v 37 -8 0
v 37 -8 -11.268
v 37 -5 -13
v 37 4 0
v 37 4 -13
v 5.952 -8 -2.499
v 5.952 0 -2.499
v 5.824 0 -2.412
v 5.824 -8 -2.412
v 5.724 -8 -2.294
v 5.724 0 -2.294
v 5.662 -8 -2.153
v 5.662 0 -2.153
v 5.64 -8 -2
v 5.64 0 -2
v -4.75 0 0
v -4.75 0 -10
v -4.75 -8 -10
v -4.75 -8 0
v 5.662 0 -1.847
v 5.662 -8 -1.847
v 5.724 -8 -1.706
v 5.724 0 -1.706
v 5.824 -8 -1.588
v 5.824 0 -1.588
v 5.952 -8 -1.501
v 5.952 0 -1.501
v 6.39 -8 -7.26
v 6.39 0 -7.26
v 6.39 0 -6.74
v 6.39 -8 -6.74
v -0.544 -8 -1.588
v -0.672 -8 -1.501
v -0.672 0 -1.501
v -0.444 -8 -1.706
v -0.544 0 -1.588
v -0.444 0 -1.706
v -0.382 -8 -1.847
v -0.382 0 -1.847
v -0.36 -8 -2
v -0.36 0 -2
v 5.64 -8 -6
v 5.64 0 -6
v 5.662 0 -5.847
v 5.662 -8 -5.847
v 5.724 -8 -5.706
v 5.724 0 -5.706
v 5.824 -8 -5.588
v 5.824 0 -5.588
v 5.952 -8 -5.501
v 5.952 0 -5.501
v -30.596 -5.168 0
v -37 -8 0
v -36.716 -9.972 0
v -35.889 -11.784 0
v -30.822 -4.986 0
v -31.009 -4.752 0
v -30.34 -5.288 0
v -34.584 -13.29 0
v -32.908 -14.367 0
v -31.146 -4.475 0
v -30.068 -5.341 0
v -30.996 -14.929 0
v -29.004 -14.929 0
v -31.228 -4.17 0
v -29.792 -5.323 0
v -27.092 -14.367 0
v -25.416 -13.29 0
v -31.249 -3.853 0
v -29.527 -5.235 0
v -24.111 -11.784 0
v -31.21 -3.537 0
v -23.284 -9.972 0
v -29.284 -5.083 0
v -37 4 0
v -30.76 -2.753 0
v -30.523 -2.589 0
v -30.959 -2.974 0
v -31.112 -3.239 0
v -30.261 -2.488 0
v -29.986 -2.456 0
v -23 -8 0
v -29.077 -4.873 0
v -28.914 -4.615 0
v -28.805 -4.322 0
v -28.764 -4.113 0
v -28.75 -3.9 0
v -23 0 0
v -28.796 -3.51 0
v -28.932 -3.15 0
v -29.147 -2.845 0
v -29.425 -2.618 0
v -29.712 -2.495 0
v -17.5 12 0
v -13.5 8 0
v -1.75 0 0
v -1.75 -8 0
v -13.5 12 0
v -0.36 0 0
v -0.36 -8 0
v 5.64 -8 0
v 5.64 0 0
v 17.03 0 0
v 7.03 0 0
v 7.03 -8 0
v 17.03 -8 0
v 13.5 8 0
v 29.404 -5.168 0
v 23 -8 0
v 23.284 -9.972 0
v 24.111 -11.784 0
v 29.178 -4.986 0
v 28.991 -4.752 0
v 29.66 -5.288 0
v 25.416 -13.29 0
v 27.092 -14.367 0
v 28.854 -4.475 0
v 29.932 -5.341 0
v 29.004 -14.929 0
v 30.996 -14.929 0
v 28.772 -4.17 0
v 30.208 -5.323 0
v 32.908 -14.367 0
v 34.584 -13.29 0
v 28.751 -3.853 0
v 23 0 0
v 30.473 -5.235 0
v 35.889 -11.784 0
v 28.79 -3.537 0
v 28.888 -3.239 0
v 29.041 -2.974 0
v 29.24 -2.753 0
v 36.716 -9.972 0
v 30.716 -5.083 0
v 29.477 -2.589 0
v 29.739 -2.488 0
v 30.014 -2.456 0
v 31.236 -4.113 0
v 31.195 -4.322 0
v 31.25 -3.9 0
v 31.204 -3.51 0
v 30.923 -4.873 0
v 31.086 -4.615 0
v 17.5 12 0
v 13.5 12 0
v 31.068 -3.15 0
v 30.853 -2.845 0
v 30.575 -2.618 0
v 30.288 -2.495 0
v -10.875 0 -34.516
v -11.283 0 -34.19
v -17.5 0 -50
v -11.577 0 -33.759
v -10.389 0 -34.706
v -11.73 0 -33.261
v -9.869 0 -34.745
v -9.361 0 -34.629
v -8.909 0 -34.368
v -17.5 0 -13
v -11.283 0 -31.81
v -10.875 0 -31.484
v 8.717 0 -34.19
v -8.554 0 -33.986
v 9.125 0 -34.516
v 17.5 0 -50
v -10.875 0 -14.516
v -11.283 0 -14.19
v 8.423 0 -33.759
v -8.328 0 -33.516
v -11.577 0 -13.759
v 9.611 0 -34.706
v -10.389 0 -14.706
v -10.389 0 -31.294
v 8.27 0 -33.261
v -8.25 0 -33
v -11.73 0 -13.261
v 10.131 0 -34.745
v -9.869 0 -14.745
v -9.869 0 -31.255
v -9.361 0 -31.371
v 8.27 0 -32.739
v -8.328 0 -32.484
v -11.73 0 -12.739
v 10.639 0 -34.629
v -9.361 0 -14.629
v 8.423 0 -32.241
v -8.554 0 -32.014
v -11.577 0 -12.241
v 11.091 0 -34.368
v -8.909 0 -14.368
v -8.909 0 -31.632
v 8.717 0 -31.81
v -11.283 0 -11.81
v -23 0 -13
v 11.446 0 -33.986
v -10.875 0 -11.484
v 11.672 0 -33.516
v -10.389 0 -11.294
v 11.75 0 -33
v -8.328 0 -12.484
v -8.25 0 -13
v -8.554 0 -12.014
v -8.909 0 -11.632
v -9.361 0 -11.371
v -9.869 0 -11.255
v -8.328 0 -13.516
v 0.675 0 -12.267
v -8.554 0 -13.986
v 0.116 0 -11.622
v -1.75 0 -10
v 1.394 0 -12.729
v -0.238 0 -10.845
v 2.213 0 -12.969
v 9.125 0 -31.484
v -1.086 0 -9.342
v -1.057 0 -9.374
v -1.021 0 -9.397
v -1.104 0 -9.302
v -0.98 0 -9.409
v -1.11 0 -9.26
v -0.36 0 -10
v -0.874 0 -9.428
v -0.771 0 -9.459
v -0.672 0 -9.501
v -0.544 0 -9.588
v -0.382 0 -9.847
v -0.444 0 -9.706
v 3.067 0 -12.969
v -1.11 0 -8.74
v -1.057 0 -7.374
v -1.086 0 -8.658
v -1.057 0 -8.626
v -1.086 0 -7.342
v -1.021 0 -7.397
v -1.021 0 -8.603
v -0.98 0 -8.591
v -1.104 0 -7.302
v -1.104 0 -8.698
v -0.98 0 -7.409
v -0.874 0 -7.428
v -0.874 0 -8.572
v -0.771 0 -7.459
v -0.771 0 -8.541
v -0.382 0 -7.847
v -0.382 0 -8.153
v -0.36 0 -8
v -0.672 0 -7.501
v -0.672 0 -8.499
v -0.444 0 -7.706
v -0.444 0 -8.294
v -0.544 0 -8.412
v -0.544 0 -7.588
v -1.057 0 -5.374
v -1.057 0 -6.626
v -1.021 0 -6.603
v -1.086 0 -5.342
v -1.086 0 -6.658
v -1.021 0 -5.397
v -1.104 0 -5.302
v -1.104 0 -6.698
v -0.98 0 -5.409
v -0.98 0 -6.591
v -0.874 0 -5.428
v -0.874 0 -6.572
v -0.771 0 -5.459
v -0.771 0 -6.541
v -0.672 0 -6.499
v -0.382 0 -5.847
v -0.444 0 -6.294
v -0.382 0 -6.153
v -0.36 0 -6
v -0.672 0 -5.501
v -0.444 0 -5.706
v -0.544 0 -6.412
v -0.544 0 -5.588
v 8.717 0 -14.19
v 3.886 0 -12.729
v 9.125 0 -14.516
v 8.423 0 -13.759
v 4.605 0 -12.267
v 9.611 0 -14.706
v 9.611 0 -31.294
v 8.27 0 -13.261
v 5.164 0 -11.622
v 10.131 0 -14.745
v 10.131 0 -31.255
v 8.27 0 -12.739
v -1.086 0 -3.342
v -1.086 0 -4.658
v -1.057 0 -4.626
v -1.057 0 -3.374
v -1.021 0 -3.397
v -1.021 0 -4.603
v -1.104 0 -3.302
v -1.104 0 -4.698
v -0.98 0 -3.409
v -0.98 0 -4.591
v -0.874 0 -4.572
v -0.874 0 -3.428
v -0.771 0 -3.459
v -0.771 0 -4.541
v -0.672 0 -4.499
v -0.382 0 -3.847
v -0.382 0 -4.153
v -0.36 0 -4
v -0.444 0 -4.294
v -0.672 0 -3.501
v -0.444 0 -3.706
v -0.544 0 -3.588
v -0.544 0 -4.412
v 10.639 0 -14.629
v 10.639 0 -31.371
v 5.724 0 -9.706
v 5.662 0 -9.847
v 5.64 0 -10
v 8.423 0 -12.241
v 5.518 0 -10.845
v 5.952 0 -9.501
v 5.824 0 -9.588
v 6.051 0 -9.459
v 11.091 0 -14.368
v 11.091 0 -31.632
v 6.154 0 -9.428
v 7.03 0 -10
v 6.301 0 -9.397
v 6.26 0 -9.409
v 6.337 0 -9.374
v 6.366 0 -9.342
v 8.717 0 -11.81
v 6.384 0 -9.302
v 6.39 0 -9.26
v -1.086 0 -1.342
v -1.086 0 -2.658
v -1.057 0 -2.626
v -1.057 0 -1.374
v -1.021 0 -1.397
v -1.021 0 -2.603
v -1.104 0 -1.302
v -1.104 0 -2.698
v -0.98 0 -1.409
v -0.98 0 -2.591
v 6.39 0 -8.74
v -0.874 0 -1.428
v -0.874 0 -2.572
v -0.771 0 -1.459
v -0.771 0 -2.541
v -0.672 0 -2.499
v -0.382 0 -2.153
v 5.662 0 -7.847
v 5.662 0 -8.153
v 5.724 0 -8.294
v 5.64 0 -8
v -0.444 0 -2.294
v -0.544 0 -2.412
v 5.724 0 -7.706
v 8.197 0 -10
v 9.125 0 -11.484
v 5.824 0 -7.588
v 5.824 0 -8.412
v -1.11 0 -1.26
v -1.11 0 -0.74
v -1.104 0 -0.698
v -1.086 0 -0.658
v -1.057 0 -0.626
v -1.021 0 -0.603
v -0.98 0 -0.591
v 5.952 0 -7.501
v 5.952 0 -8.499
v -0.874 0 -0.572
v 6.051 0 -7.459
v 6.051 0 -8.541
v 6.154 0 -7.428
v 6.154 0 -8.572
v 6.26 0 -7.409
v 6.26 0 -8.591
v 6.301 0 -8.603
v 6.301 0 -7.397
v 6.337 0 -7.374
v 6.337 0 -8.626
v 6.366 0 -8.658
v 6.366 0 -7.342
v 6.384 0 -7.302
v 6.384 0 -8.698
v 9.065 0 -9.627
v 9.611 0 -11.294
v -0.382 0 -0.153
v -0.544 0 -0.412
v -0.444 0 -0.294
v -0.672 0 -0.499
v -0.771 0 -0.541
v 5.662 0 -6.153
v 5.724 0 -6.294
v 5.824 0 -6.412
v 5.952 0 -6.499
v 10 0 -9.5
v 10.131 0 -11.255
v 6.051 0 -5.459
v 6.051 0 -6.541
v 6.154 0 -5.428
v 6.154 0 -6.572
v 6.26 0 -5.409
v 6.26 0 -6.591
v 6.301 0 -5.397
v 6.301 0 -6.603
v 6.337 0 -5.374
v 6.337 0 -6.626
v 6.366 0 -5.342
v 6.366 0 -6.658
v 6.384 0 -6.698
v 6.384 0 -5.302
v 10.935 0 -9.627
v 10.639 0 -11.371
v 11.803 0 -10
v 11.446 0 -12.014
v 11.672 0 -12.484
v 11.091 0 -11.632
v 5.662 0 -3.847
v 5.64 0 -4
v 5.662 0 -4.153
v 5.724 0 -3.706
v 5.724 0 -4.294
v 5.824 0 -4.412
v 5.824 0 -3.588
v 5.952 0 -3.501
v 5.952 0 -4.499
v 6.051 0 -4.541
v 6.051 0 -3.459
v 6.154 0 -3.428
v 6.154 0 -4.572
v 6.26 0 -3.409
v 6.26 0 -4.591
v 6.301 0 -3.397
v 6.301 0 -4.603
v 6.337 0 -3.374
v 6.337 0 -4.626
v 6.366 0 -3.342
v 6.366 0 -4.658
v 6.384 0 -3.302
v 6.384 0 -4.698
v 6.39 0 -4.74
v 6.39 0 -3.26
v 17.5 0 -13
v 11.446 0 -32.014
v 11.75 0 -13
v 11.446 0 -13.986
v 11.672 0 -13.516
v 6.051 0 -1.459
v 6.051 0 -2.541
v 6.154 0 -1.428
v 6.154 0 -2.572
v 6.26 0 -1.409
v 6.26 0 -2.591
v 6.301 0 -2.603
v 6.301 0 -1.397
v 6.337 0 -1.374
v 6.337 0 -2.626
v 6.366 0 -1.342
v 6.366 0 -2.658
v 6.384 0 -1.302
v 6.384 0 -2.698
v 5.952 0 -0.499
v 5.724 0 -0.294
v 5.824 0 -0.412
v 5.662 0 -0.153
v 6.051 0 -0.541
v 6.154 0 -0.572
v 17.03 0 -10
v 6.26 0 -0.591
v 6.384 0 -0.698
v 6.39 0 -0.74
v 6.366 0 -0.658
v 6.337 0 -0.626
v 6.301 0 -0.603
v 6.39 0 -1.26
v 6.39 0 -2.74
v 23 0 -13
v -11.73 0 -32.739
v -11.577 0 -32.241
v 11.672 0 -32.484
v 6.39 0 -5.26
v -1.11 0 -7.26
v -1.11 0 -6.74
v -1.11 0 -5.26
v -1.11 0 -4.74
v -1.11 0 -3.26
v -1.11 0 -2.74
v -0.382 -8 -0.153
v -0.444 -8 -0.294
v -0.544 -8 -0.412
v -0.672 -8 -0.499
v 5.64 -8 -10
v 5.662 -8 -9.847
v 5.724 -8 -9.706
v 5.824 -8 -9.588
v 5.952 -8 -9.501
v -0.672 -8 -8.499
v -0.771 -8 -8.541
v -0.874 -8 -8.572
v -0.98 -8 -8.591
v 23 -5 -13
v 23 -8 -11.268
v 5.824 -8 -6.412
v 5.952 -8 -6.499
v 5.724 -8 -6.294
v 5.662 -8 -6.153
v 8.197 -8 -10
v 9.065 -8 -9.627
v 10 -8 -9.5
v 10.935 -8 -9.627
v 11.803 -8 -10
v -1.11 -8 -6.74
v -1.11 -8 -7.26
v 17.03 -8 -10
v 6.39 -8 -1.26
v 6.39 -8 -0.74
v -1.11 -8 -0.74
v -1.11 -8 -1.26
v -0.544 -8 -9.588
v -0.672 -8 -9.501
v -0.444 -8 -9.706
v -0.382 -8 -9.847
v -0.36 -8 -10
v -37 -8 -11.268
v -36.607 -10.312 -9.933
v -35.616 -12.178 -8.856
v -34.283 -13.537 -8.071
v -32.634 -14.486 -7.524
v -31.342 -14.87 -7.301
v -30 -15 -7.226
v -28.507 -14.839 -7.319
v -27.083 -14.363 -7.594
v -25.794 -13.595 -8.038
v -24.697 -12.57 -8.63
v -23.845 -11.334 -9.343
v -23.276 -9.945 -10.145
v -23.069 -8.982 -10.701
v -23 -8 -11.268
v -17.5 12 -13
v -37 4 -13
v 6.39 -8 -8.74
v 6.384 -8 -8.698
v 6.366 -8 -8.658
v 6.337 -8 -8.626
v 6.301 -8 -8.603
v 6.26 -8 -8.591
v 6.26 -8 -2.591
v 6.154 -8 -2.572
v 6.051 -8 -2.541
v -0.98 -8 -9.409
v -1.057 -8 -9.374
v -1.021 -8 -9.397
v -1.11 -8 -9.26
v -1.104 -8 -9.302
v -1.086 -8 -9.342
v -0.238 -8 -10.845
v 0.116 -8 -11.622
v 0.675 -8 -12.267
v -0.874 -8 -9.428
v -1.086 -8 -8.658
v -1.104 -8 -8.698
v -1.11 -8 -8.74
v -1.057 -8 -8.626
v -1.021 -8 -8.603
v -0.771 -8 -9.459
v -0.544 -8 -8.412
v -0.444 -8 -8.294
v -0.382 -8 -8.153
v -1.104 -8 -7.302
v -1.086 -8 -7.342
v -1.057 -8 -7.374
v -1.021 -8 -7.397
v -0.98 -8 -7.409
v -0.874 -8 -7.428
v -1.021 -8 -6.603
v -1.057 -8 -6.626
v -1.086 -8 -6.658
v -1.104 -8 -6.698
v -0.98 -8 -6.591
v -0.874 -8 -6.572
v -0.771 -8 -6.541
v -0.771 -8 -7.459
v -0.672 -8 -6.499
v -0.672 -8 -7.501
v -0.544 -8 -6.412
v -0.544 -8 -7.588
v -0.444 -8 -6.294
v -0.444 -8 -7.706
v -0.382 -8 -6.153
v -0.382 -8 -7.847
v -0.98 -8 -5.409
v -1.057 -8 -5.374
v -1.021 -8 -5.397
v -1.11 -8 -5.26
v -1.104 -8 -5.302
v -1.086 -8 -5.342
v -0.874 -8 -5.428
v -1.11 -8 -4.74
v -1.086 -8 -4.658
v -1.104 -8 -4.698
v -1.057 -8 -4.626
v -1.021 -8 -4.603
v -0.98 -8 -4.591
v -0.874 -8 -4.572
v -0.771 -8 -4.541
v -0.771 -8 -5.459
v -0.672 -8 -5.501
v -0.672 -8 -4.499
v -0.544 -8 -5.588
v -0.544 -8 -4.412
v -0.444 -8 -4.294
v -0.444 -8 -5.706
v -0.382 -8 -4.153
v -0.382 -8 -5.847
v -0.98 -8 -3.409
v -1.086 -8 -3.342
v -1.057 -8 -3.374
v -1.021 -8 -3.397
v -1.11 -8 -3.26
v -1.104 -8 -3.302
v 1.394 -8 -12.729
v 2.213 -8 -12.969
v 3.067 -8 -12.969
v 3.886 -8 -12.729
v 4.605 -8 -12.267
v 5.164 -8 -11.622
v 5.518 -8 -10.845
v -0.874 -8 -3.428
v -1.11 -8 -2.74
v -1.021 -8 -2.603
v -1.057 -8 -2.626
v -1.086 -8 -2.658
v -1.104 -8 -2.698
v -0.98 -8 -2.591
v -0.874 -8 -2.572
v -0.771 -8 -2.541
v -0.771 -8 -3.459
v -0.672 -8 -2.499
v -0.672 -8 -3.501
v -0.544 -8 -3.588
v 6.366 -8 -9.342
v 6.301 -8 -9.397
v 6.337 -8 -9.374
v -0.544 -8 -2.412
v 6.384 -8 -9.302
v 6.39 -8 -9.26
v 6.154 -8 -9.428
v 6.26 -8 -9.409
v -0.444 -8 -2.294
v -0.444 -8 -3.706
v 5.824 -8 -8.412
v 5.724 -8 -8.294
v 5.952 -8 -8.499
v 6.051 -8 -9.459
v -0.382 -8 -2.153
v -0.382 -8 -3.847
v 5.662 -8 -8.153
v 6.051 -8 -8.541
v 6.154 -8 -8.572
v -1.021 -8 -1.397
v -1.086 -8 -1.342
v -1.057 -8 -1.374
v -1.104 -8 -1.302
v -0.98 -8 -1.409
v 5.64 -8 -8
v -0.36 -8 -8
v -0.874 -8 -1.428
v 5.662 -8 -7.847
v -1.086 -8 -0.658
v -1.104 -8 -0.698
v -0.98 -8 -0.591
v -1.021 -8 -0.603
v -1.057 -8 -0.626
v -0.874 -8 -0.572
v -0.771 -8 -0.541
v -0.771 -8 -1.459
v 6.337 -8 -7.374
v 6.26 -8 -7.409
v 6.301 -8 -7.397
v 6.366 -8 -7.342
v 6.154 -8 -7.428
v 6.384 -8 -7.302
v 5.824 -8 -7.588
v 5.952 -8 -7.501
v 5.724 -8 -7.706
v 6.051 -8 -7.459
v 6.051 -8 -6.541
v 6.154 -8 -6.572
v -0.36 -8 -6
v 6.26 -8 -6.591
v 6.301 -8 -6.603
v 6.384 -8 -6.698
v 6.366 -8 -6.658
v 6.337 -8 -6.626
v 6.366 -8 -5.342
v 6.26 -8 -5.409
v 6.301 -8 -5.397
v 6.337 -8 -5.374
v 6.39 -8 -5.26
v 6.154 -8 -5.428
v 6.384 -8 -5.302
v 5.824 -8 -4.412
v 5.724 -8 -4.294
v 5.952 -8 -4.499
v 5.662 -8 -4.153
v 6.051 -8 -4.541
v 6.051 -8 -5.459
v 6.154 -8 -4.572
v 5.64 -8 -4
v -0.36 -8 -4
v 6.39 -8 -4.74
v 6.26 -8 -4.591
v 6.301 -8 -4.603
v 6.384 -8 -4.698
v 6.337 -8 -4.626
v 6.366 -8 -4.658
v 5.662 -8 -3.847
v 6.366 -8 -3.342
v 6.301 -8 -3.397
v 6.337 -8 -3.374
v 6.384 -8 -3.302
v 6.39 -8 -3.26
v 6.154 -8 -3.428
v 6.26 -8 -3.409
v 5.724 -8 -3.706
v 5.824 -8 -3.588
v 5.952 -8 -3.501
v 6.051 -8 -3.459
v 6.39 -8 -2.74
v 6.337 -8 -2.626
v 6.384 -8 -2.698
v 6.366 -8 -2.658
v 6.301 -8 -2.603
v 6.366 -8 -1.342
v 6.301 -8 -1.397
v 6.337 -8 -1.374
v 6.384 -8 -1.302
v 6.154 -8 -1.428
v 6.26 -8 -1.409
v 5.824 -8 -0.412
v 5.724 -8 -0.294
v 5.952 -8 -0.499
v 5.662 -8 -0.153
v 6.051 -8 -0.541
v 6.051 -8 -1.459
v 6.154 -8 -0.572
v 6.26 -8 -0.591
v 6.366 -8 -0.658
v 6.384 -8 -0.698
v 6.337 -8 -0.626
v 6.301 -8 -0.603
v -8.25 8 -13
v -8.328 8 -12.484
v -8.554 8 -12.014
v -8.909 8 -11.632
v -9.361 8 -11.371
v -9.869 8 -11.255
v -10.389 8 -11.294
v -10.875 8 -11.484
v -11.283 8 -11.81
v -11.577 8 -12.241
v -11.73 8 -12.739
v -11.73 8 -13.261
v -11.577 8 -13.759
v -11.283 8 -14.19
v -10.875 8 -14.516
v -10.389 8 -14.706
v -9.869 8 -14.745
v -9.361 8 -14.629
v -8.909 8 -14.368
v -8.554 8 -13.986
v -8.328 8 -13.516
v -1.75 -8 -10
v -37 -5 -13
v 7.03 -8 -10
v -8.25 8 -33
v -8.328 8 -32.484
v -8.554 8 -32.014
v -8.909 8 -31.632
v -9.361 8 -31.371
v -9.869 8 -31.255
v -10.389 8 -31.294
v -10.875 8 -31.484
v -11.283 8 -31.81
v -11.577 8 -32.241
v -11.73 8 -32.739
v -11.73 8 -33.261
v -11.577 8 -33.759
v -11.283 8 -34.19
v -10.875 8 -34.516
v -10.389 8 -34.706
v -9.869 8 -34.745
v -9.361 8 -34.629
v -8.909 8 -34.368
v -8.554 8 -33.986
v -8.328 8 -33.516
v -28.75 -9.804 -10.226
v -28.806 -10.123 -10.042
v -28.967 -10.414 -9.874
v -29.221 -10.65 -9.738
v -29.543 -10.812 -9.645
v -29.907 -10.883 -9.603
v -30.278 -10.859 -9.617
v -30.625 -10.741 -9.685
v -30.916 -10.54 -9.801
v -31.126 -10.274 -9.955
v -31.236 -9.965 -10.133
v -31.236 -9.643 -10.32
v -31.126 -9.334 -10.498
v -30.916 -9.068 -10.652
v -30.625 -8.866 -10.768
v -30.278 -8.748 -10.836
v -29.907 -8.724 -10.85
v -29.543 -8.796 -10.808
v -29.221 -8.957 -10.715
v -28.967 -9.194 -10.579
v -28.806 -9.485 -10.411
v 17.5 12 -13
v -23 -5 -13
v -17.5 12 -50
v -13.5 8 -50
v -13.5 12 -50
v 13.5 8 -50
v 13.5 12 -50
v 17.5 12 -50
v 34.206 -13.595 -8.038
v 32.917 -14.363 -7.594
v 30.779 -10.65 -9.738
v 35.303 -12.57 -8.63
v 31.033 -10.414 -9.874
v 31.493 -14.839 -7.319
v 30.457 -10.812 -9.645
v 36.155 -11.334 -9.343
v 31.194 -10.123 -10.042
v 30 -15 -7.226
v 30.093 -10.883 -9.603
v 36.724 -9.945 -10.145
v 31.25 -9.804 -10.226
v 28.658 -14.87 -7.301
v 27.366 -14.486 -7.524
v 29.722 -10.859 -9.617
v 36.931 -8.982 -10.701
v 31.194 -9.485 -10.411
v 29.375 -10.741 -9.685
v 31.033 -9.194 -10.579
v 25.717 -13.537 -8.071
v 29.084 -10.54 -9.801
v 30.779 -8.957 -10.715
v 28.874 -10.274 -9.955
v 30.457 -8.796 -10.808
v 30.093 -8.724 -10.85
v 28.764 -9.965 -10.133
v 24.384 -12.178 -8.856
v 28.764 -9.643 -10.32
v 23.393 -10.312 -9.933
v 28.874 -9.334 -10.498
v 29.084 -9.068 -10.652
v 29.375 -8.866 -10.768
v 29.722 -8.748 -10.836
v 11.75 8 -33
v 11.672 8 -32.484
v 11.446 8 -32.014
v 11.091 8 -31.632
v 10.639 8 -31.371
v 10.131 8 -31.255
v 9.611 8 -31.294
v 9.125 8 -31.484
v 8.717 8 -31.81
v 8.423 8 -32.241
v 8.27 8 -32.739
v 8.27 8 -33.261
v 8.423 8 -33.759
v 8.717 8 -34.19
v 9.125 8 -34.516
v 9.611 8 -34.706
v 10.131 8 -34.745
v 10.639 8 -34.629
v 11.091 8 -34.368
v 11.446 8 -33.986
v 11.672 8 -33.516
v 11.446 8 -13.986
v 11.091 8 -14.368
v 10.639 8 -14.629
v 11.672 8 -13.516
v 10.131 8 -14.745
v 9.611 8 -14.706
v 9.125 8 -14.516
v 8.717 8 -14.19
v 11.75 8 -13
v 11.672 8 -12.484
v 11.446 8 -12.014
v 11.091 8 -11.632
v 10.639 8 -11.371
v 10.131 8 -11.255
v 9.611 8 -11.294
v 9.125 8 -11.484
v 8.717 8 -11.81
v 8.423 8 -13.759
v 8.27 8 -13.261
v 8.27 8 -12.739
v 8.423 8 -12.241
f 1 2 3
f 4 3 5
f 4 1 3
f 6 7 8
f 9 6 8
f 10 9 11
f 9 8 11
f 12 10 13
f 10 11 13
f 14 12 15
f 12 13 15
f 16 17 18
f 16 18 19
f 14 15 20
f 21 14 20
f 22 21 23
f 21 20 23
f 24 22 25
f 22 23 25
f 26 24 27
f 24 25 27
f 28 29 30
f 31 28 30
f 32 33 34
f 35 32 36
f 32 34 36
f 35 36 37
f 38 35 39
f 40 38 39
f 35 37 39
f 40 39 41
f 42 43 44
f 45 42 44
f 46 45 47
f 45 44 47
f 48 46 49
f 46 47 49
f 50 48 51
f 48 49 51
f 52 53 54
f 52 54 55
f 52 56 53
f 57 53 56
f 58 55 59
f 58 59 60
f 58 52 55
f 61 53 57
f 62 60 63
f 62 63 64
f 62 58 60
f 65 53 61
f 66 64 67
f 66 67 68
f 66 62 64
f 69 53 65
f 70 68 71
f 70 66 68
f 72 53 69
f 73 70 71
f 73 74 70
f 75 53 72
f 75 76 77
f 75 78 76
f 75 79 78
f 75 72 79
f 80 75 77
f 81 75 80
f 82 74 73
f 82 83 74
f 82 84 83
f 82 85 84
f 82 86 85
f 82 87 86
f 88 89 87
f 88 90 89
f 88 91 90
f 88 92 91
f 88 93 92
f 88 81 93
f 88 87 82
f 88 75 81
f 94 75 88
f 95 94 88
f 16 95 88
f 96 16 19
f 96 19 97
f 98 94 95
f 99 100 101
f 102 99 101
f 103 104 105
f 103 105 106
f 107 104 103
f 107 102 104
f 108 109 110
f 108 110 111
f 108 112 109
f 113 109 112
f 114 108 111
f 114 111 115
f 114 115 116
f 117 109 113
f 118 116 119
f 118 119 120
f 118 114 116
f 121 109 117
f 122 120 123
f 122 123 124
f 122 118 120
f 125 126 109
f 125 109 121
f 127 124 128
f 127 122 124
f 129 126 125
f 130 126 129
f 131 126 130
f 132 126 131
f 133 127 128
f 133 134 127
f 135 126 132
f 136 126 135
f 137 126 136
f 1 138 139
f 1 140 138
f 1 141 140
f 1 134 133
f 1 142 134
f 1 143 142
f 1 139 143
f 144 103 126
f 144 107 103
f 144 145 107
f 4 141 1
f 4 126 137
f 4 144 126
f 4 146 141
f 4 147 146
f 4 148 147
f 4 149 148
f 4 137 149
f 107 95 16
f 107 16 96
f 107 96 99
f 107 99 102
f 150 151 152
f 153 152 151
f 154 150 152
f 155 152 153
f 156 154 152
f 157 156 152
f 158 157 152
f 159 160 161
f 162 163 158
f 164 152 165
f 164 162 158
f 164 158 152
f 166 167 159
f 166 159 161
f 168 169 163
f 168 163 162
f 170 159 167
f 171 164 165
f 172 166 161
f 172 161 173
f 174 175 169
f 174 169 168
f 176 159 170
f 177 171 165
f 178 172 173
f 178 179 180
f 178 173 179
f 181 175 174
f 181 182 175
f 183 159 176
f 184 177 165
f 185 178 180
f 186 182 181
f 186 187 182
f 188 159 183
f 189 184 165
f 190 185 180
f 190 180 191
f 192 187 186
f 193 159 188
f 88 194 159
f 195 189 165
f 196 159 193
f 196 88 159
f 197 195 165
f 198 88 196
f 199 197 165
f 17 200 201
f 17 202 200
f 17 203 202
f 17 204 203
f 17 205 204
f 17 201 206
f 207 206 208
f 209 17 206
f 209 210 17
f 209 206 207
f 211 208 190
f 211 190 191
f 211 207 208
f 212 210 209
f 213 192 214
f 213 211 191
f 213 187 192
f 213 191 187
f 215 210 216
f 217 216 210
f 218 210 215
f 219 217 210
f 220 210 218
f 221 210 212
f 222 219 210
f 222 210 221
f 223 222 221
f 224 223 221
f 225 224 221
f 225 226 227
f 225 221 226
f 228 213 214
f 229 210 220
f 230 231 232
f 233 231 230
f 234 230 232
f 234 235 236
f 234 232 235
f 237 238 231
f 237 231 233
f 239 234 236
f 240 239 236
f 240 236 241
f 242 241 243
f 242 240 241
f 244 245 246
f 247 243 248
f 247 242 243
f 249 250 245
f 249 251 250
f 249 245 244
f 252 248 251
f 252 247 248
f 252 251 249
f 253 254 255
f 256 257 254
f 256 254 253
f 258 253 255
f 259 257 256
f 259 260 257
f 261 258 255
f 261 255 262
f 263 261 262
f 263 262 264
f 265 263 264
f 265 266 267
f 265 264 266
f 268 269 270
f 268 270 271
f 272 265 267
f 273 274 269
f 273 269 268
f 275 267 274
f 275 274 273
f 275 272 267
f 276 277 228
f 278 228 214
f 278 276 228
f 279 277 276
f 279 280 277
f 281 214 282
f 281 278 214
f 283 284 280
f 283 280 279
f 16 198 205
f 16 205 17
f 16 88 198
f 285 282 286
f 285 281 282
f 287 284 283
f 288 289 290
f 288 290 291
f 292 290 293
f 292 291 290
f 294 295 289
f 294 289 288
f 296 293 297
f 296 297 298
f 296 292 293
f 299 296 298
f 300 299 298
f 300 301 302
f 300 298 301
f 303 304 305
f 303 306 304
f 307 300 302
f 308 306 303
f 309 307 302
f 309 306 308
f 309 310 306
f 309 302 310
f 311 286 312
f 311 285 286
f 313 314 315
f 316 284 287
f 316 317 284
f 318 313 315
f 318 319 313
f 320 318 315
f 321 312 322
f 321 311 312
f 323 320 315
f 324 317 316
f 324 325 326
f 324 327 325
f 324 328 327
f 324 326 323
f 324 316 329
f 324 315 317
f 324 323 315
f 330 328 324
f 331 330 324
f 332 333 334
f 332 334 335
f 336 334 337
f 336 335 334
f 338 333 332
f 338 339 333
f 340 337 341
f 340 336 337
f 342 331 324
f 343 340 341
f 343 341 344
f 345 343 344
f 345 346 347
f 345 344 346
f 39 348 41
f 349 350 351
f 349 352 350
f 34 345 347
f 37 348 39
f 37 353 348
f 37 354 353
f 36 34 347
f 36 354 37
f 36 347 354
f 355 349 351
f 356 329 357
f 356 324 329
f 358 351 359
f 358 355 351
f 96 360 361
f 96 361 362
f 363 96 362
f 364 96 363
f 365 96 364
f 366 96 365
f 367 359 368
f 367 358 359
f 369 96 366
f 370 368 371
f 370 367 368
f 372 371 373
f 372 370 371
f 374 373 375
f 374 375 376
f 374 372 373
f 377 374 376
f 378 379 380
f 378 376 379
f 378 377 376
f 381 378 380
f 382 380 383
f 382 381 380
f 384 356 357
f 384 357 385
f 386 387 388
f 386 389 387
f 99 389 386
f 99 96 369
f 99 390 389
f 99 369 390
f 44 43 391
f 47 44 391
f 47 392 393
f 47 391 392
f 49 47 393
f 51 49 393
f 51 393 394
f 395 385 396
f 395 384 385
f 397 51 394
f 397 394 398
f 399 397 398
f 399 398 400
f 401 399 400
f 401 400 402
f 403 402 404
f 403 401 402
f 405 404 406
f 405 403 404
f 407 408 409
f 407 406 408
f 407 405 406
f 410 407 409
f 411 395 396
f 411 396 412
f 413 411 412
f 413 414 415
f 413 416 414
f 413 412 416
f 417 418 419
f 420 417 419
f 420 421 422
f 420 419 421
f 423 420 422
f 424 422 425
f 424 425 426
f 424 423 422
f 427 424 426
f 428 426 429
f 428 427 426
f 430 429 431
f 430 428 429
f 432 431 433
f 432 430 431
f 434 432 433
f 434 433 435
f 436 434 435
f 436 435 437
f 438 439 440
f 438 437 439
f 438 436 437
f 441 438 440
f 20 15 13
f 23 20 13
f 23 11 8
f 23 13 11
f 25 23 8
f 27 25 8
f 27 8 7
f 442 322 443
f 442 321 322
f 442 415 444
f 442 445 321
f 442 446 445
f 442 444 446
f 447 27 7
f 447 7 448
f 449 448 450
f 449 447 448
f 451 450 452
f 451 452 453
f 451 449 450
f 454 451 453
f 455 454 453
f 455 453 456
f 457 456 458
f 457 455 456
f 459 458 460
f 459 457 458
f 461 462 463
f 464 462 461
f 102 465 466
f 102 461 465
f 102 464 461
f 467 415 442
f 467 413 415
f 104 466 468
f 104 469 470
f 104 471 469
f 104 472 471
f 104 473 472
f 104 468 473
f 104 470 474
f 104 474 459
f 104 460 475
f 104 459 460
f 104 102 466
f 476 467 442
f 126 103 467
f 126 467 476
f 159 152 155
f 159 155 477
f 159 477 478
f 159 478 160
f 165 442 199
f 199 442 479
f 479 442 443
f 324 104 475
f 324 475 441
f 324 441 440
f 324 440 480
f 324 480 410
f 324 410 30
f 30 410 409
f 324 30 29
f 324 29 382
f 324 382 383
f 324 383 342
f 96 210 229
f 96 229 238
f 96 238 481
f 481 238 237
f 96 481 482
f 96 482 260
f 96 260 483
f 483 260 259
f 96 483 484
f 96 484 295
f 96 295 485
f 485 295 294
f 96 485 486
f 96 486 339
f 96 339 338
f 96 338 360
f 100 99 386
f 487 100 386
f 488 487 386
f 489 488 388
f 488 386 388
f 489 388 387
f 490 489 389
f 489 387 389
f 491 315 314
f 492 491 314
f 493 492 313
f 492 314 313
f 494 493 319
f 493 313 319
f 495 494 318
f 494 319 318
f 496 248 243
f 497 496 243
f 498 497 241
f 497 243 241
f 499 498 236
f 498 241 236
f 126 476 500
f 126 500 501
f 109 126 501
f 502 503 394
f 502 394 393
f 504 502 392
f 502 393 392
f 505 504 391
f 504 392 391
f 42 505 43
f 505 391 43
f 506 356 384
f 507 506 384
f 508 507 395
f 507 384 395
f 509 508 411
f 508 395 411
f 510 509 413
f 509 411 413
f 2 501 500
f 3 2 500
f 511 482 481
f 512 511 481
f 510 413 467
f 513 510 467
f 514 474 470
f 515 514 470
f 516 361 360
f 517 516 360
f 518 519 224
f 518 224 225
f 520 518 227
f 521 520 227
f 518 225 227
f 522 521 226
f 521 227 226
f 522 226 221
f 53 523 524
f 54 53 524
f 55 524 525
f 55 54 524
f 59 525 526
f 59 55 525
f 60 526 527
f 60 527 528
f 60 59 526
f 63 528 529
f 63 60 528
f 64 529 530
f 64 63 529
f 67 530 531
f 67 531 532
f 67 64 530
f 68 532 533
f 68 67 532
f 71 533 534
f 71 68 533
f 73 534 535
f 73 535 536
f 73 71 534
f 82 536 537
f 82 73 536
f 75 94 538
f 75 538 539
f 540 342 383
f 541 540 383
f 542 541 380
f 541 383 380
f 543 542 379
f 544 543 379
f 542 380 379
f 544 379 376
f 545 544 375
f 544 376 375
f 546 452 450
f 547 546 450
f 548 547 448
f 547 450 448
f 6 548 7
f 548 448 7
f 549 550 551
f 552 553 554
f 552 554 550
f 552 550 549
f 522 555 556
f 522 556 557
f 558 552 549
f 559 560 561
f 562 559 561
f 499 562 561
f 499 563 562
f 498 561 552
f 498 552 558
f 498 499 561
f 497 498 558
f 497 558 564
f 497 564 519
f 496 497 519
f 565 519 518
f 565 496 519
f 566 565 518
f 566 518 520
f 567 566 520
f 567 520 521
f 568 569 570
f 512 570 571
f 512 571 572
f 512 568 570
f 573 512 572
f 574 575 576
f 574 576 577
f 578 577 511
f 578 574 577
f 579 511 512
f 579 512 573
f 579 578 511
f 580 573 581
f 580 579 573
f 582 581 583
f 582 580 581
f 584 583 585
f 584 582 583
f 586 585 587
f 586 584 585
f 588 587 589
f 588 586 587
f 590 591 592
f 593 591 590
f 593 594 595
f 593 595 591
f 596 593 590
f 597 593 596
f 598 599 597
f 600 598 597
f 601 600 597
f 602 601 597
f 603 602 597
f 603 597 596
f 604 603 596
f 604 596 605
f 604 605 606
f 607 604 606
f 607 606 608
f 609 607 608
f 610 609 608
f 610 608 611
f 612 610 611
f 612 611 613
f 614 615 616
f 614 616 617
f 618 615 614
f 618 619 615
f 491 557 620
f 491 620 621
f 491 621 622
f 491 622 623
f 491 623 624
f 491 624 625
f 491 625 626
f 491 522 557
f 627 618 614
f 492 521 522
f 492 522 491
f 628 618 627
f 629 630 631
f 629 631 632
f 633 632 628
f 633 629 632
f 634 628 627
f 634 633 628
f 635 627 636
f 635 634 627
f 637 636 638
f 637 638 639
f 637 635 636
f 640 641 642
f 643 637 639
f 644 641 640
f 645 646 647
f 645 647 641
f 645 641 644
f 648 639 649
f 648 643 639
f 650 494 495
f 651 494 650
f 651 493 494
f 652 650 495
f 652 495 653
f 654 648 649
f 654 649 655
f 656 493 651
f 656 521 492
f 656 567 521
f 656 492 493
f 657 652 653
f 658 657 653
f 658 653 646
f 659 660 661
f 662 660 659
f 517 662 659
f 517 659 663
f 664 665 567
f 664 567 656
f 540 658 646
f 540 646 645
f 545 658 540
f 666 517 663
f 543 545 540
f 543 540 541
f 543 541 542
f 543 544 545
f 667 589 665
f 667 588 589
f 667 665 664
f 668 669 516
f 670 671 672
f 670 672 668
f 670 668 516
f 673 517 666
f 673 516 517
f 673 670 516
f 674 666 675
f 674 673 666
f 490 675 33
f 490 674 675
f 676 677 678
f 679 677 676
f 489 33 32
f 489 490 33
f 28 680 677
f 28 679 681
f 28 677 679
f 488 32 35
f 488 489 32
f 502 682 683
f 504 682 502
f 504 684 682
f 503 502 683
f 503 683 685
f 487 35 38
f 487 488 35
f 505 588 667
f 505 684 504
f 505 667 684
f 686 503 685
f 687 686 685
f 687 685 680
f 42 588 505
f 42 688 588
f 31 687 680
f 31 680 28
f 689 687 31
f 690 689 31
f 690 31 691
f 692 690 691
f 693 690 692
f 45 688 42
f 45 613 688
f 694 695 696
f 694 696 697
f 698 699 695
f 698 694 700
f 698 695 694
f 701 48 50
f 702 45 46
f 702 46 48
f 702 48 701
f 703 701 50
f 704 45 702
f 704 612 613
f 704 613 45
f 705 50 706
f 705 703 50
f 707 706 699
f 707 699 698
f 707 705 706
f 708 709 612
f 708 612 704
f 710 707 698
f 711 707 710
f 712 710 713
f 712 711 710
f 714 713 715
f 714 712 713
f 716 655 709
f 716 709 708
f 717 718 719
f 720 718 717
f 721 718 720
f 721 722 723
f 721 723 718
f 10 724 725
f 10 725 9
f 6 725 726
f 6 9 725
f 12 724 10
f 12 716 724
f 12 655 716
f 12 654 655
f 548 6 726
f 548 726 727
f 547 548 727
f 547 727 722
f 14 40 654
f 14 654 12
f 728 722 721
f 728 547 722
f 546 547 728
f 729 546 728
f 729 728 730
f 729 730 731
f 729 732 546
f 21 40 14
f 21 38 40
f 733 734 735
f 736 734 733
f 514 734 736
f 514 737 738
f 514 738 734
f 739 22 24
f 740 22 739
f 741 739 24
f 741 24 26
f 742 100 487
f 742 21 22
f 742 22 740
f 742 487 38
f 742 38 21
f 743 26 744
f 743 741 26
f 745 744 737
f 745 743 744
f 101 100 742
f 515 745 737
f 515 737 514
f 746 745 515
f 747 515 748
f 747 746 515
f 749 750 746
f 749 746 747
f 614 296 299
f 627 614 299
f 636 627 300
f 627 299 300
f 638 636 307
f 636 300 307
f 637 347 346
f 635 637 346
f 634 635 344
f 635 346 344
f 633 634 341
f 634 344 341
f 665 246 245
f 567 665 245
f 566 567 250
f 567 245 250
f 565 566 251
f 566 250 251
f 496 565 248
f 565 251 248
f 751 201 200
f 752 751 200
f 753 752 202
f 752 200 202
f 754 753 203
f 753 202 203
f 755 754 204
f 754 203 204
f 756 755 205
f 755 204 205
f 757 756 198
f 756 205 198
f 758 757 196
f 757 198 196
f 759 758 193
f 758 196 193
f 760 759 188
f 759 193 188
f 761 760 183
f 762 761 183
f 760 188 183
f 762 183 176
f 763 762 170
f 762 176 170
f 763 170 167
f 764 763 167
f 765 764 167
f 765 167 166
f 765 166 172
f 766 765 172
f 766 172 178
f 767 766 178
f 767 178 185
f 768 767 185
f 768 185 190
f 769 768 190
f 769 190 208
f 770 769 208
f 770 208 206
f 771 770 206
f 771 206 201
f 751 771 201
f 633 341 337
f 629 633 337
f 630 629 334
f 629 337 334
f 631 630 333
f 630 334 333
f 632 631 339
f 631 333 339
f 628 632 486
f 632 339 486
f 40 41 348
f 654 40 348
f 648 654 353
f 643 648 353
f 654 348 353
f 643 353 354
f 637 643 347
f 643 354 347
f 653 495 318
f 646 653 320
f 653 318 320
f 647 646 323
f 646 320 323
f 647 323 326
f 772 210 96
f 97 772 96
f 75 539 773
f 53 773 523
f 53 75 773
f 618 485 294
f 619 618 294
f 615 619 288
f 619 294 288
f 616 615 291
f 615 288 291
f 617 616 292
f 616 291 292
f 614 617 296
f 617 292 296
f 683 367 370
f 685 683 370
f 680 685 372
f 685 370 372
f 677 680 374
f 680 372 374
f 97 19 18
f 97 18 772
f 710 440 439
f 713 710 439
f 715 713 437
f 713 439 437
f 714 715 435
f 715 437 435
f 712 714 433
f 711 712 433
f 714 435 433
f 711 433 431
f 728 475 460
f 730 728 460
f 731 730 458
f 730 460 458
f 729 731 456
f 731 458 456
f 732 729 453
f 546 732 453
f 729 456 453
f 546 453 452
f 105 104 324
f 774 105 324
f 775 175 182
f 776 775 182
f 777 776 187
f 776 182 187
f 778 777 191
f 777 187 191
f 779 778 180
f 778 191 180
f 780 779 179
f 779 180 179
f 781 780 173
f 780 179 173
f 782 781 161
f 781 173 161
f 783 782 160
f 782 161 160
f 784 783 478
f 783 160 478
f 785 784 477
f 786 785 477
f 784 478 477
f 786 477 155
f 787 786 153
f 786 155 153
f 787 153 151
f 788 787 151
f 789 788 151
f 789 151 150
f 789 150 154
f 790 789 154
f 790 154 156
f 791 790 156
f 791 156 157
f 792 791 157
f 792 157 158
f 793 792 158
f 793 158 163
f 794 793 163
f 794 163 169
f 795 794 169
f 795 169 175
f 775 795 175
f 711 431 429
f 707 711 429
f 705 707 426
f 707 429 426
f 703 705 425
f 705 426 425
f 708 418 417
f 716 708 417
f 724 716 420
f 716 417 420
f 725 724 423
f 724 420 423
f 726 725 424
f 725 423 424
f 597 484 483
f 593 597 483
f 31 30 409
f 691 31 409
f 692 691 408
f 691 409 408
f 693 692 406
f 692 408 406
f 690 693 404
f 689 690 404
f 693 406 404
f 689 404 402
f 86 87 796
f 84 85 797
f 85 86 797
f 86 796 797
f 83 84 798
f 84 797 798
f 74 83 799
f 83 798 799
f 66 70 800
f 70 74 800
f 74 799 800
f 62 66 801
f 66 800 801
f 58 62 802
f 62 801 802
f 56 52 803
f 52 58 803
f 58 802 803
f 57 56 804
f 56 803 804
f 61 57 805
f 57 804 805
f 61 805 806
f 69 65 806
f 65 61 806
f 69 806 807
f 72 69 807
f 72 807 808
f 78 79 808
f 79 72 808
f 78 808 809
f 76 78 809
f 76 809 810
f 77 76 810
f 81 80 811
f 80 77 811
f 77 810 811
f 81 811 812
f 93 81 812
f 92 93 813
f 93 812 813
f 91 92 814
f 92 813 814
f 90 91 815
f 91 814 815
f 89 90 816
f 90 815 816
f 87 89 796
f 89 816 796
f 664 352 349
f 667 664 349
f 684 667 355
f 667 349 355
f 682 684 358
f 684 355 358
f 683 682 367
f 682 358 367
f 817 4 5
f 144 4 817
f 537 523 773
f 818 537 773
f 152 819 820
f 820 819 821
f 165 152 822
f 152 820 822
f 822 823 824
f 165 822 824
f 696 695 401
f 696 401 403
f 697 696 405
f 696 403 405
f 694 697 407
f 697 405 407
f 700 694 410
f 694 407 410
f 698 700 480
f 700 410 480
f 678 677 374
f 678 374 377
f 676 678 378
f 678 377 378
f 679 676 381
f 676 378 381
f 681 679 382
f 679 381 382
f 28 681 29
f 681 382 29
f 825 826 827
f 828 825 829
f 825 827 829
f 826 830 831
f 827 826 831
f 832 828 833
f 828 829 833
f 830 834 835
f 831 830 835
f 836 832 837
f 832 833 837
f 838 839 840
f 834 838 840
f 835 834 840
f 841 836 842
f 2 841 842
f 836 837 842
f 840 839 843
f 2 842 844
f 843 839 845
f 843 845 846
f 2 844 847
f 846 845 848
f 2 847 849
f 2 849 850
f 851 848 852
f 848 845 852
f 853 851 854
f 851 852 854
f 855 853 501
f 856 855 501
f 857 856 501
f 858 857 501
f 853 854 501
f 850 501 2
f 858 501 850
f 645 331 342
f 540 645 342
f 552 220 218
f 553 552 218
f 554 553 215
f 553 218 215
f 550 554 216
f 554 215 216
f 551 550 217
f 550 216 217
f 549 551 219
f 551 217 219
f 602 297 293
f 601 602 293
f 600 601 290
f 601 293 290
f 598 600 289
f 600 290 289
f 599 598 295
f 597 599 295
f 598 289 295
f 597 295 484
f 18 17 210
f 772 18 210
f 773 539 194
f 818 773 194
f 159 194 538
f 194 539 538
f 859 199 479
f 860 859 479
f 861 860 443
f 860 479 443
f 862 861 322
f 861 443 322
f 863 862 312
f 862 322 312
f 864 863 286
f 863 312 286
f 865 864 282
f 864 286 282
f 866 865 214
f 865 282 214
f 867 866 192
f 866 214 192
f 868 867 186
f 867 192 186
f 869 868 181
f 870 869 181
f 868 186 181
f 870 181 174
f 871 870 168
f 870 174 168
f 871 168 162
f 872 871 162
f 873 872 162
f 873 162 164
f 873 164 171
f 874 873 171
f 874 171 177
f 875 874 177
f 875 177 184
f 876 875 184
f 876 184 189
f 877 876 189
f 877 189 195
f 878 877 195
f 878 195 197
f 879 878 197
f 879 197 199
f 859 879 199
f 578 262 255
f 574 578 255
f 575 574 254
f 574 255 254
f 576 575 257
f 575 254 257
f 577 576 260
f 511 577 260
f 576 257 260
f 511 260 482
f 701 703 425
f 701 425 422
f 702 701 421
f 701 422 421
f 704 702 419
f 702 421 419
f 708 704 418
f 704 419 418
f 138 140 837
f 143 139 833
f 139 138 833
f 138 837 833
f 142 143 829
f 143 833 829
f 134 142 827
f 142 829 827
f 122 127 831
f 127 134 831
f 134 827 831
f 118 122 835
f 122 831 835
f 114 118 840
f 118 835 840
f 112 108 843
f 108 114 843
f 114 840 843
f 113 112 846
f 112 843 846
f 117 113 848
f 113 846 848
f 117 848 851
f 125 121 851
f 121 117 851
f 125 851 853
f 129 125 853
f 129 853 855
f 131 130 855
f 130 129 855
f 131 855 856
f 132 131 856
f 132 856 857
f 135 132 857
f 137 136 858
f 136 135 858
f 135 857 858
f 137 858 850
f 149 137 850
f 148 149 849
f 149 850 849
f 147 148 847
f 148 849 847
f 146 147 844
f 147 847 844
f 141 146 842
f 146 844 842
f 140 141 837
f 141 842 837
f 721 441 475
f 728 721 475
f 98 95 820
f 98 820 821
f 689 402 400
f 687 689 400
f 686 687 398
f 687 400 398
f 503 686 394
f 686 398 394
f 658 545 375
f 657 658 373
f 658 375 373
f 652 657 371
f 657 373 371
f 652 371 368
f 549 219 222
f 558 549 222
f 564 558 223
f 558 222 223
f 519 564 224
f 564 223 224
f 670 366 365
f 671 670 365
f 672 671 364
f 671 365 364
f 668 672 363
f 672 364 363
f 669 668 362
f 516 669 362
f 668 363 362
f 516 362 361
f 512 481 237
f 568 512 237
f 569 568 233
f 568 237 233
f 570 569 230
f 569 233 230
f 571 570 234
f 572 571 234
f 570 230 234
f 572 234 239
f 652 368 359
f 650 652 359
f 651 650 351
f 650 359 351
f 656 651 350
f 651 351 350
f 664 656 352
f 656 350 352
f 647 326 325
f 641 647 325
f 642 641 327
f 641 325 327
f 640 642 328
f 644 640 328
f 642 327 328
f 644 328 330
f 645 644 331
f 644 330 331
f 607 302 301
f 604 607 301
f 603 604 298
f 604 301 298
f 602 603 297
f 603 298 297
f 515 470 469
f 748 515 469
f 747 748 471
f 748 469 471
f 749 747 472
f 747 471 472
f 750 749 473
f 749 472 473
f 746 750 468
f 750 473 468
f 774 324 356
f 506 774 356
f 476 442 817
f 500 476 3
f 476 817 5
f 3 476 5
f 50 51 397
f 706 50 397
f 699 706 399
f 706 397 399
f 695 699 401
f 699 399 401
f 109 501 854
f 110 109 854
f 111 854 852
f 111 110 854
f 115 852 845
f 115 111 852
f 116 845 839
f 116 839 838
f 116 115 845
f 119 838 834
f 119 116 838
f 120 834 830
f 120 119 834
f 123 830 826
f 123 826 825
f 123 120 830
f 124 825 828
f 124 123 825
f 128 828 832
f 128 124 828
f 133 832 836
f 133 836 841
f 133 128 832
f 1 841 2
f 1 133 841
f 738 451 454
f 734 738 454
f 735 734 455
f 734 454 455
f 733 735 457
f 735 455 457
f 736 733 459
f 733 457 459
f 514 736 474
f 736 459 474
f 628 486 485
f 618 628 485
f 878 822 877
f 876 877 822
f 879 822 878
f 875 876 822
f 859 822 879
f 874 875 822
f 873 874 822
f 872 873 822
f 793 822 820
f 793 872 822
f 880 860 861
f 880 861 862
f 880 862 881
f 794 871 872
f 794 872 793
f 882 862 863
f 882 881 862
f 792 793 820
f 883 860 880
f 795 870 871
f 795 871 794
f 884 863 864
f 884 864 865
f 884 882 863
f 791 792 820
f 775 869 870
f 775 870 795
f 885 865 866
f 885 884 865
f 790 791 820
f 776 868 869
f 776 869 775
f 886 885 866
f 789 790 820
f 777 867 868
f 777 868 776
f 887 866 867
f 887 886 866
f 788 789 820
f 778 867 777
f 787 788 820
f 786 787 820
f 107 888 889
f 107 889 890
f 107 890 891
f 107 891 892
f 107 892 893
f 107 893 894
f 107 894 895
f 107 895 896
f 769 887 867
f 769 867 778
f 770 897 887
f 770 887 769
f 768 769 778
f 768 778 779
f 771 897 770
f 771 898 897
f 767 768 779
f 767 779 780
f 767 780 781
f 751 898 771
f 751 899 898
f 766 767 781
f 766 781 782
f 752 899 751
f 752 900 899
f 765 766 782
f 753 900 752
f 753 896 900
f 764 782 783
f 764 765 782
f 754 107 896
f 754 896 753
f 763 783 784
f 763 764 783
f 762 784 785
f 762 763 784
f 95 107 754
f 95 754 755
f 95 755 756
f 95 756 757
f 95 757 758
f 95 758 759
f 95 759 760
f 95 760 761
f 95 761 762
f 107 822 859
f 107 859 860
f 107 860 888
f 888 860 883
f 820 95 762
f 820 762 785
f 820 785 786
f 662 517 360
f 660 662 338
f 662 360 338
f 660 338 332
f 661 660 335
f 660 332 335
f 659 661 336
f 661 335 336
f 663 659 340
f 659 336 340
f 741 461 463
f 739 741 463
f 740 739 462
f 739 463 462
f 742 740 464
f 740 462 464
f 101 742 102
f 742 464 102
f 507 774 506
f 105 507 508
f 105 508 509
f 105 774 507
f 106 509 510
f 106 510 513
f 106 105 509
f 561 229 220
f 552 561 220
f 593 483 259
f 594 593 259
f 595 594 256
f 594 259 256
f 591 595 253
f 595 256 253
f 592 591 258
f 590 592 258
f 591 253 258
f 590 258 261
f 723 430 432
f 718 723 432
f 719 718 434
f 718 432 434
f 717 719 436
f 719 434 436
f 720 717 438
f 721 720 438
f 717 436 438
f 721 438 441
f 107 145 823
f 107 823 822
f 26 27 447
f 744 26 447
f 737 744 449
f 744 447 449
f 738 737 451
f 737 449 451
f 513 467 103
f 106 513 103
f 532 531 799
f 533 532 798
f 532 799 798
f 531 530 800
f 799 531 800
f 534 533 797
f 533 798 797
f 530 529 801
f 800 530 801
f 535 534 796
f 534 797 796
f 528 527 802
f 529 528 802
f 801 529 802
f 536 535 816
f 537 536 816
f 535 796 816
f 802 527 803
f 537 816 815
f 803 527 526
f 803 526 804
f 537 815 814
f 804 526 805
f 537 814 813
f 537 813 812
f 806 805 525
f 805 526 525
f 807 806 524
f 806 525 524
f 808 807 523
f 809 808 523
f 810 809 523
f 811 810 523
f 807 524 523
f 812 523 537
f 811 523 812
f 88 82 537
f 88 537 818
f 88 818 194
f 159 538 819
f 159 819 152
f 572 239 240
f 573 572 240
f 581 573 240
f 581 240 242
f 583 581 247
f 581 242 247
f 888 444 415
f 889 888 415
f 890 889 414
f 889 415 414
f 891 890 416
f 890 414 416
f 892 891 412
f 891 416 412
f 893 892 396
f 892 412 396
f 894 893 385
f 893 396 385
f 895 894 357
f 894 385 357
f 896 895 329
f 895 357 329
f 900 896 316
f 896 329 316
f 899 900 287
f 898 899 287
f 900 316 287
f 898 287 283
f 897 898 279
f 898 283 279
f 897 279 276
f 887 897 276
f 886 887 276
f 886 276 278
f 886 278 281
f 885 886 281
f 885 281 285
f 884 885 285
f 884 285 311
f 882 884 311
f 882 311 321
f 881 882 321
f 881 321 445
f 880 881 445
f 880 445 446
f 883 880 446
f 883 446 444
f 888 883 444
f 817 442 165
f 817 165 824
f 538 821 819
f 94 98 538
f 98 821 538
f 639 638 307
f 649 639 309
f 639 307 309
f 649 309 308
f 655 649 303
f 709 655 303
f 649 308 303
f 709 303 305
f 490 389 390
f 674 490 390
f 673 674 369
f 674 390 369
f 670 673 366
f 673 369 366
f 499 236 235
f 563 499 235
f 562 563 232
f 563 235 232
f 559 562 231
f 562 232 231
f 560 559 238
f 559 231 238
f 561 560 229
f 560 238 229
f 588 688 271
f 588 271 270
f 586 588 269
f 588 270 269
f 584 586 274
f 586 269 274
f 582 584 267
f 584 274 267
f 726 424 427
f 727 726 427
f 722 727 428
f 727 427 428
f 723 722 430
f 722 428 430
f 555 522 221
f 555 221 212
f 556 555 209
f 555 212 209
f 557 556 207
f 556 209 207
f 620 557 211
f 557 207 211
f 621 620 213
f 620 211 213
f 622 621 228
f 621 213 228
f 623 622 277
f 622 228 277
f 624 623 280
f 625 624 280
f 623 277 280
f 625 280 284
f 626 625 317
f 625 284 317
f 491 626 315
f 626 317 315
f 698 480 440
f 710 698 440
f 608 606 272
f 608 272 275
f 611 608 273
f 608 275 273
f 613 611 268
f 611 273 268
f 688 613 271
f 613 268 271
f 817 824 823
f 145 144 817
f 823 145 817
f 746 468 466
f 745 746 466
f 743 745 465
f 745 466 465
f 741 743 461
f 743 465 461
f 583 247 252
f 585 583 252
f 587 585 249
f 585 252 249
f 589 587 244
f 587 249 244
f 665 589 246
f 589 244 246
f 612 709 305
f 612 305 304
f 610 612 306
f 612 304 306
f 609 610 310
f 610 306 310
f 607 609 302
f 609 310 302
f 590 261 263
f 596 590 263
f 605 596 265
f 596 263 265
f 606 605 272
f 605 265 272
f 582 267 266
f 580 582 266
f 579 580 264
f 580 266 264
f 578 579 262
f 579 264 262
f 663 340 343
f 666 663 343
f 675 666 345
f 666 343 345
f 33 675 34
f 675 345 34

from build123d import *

# Parameters (mm, degrees)
F1_DEPTH = 50
F2_DEPTH = 13
F4_DEPTH = 74.001
F5_R     = 1.25
F6_DEPTH = 15
F7_W     = 3
F7_H     = 10
F8_DEPTH = 8
F7_R     = 1.75
F9_DEPTH = 25


with BuildPart() as f1:
    # F0 (on Top) → F1 (new body)
    with BuildSketch(Plane.XY):
        Polygon((-17.5, 12), (-17.5, 0), (0, 0), (17.5, 0), (17.5, 12), (13.5, 12), (13.5, 8), (-13.5, 8), (-13.5, 12), align=None)
    extrude(amount=-F1_DEPTH)

    # F0 (on Top) → F2 (join)
    with BuildSketch(Plane.XY):
        with BuildLine():
            Line((-37, 0), (-37, -8))
            ThreePointArc((-37, -8), (-30, -15), (-23, -8))
            Line((-23, -8), (-23, 0))
            Line((-23, 0), (-17.5, 0))
            Line((-17.5, 0), (-17.5, 12))
            Line((-17.5, 12), (-37, 4))
            Line((-37, 4), (-37, 0))
        make_face()
        with BuildLine():
            Line((17.5, 12), (17.5, 0))
            Line((17.5, 0), (23, 0))
            Line((23, 0), (23, -8))
            ThreePointArc((23, -8), (30, -15), (37, -8))
            Line((37, -8), (37, 0))
            Line((37, 0), (37, 4))
            Line((37, 4), (17.5, 12))
        make_face()
    extrude(amount=-F2_DEPTH)

    # F3 (on face) → F4 (cut, through all)
    with BuildSketch(Plane(origin=(-37, 0, 0), x_dir=(0, -1, 0), z_dir=(-1, 0, 0))):
        Polygon((8, -11.267949), (8, -13), (15, -13), (15, -7.226497), align=None)
        Polygon((5, -13), (8, -13), (8, -11.267949), align=None)
    extrude(amount=-F4_DEPTH, mode=Mode.SUBTRACT)

    # F5 (on face) → F6 (cut)
    with BuildSketch(Plane(origin=(0, -6.879165, -11.915064), x_dir=(1, 0, 0), z_dir=(0, -0.5, -0.866025))):
        with Locations((-30, 3.377132)):
            Circle(F5_R)
        with Locations((30, 3.377132)):
            Circle(F5_R)
    extrude(amount=-F6_DEPTH, mode=Mode.SUBTRACT)

    # F7 (on face) → F8 (join)
    with BuildSketch(Plane.XZ):
        with BuildLine():
            Line((17.03, 0), (7.03, 0))
            Line((7.03, 0), (7.03, -10))
            Line((7.03, -10), (8.197224, -10))
            ThreePointArc((8.197224, -10), (10, -9.5), (11.802776, -10))
            Line((11.802776, -10), (17.03, -10))
            Line((17.03, -10), (17.03, 0))
        make_face()
        with BuildLine():
            Line((6.39, -1.259825), (6.39, -1))
            Line((6.39, -1), (6.39, -0.740175))
            ThreePointArc((6.39, -0.740175), (6.352771, -0.641268), (6.259565, -0.591457))
            ThreePointArc((6.259565, -0.591457), (6.101938, -0.557612), (5.951798, -0.498876))
            ThreePointArc((5.951798, -0.498876), (5.724361, -0.294149), (5.64, 0))
            Line((5.64, 0), (-0.36, 0))
            ThreePointArc((-0.36, 0), (-0.444361, -0.294149), (-0.671798, -0.498876))
            ThreePointArc((-0.671798, -0.498876), (-0.821938, -0.557612), (-0.979565, -0.591457))
            ThreePointArc((-0.979565, -0.591457), (-1.072771, -0.641268), (-1.11, -0.740175))
            Line((-1.11, -0.740175), (-1.11, -1))
            Line((-1.11, -1), (-1.11, -1.259825))
            ThreePointArc((-1.11, -1.259825), (-1.072771, -1.358732), (-0.979565, -1.408543))
            ThreePointArc((-0.979565, -1.408543), (-0.821938, -1.442388), (-0.671798, -1.501124))
            ThreePointArc((-0.671798, -1.501124), (-0.444361, -1.705851), (-0.36, -2))
            ThreePointArc((-0.36, -2), (-0.444361, -2.294149), (-0.671798, -2.498876))
            ThreePointArc((-0.671798, -2.498876), (-0.821938, -2.557612), (-0.979565, -2.591457))
            ThreePointArc((-0.979565, -2.591457), (-1.072771, -2.641268), (-1.11, -2.740175))
            Line((-1.11, -2.740175), (-1.11, -3))
            Line((-1.11, -3), (-1.11, -3.259825))
            ThreePointArc((-1.11, -3.259825), (-1.072771, -3.358732), (-0.979565, -3.408543))
            ThreePointArc((-0.979565, -3.408543), (-0.821938, -3.442388), (-0.671798, -3.501124))
            ThreePointArc((-0.671798, -3.501124), (-0.444361, -3.705851), (-0.36, -4))
            ThreePointArc((-0.36, -4), (-0.444361, -4.294149), (-0.671798, -4.498876))
            ThreePointArc((-0.671798, -4.498876), (-0.821938, -4.557612), (-0.979565, -4.591457))
            ThreePointArc((-0.979565, -4.591457), (-1.072771, -4.641268), (-1.11, -4.740175))
            Line((-1.11, -4.740175), (-1.11, -5))
            Line((-1.11, -5), (-1.11, -5.259825))
            ThreePointArc((-1.11, -5.259825), (-1.072771, -5.358732), (-0.979565, -5.408543))
            ThreePointArc((-0.979565, -5.408543), (-0.821938, -5.442388), (-0.671798, -5.501124))
            ThreePointArc((-0.671798, -5.501124), (-0.444361, -5.705851), (-0.36, -6))
            ThreePointArc((-0.36, -6), (-0.444361, -6.294149), (-0.671798, -6.498876))
            ThreePointArc((-0.671798, -6.498876), (-0.821938, -6.557612), (-0.979565, -6.591457))
            ThreePointArc((-0.979565, -6.591457), (-1.072771, -6.641268), (-1.11, -6.740175))
            Line((-1.11, -6.740175), (-1.11, -7))
            Line((-1.11, -7), (-1.11, -7.259825))
            ThreePointArc((-1.11, -7.259825), (-1.072771, -7.358732), (-0.979565, -7.408543))
            ThreePointArc((-0.979565, -7.408543), (-0.821938, -7.442388), (-0.671798, -7.501124))
            ThreePointArc((-0.671798, -7.501124), (-0.444361, -7.705851), (-0.36, -8))
            ThreePointArc((-0.36, -8), (-0.444361, -8.294149), (-0.671798, -8.498876))
            ThreePointArc((-0.671798, -8.498876), (-0.821938, -8.557612), (-0.979565, -8.591457))
            ThreePointArc((-0.979565, -8.591457), (-1.072771, -8.641268), (-1.11, -8.740175))
            Line((-1.11, -8.740175), (-1.11, -9))
            Line((-1.11, -9), (-1.11, -9.259825))
            ThreePointArc((-1.11, -9.259825), (-1.072771, -9.358732), (-0.979565, -9.408543))
            ThreePointArc((-0.979565, -9.408543), (-0.821938, -9.442388), (-0.671798, -9.501124))
            ThreePointArc((-0.671798, -9.501124), (-0.444361, -9.705851), (-0.36, -10))
            ThreePointArc((-0.36, -10), (2.64, -13), (5.64, -10))
            ThreePointArc((5.64, -10), (5.724361, -9.705851), (5.951798, -9.501124))
            ThreePointArc((5.951798, -9.501124), (6.101938, -9.442388), (6.259565, -9.408543))
            ThreePointArc((6.259565, -9.408543), (6.352771, -9.358732), (6.39, -9.259825))
            Line((6.39, -9.259825), (6.39, -9))
            Line((6.39, -9), (6.39, -8.740175))
            ThreePointArc((6.39, -8.740175), (6.352771, -8.641268), (6.259565, -8.591457))
            ThreePointArc((6.259565, -8.591457), (6.101938, -8.557612), (5.951798, -8.498876))
            ThreePointArc((5.951798, -8.498876), (5.724361, -8.294149), (5.64, -8))
            ThreePointArc((5.64, -8), (5.724361, -7.705851), (5.951798, -7.501124))
            ThreePointArc((5.951798, -7.501124), (6.101938, -7.442388), (6.259565, -7.408543))
            ThreePointArc((6.259565, -7.408543), (6.352771, -7.358732), (6.39, -7.259825))
            Line((6.39, -7.259825), (6.39, -7))
            Line((6.39, -7), (6.39, -6.740175))
            ThreePointArc((6.39, -6.740175), (6.352771, -6.641268), (6.259565, -6.591457))
            ThreePointArc((6.259565, -6.591457), (6.101938, -6.557612), (5.951798, -6.498876))
            ThreePointArc((5.951798, -6.498876), (5.724361, -6.294149), (5.64, -6))
            ThreePointArc((5.64, -6), (5.724361, -5.705851), (5.951798, -5.501124))
            ThreePointArc((5.951798, -5.501124), (6.101938, -5.442388), (6.259565, -5.408543))
            ThreePointArc((6.259565, -5.408543), (6.352771, -5.358732), (6.39, -5.259825))
            Line((6.39, -5.259825), (6.39, -5))
            Line((6.39, -5), (6.39, -4.740175))
            ThreePointArc((6.39, -4.740175), (6.352771, -4.641268), (6.259565, -4.591457))
            ThreePointArc((6.259565, -4.591457), (6.101938, -4.557612), (5.951798, -4.498876))
            ThreePointArc((5.951798, -4.498876), (5.724361, -4.294149), (5.64, -4))
            ThreePointArc((5.64, -4), (5.724361, -3.705851), (5.951798, -3.501124))
            ThreePointArc((5.951798, -3.501124), (6.101938, -3.442388), (6.259565, -3.408543))
            ThreePointArc((6.259565, -3.408543), (6.352771, -3.358732), (6.39, -3.259825))
            Line((6.39, -3.259825), (6.39, -3))
            Line((6.39, -3), (6.39, -2.740175))
            ThreePointArc((6.39, -2.740175), (6.352771, -2.641268), (6.259565, -2.591457))
            ThreePointArc((6.259565, -2.591457), (6.101938, -2.557612), (5.951798, -2.498876))
            ThreePointArc((5.951798, -2.498876), (5.724361, -2.294149), (5.64, -2))
            ThreePointArc((5.64, -2), (5.724361, -1.705851), (5.951798, -1.501124))
            ThreePointArc((5.951798, -1.501124), (6.101938, -1.442388), (6.259565, -1.408543))
            ThreePointArc((6.259565, -1.408543), (6.352771, -1.358732), (6.39, -1.259825))
        make_face()
        with Locations((-3.25, -5)):
            Rectangle(F7_W, F7_H)
    extrude(amount=F8_DEPTH)

    # F7 (on face) → F9 (cut)
    with BuildSketch(Plane.XZ):
        with Locations((-10, -13)):
            Circle(F7_R)
        with Locations((10, -13)):
            Circle(F7_R)
        with Locations((10, -33)):
            Circle(F7_R)
        with Locations((-10, -33)):
            Circle(F7_R)
    extrude(amount=-F9_DEPTH, mode=Mode.SUBTRACT)


solid = f1.part
